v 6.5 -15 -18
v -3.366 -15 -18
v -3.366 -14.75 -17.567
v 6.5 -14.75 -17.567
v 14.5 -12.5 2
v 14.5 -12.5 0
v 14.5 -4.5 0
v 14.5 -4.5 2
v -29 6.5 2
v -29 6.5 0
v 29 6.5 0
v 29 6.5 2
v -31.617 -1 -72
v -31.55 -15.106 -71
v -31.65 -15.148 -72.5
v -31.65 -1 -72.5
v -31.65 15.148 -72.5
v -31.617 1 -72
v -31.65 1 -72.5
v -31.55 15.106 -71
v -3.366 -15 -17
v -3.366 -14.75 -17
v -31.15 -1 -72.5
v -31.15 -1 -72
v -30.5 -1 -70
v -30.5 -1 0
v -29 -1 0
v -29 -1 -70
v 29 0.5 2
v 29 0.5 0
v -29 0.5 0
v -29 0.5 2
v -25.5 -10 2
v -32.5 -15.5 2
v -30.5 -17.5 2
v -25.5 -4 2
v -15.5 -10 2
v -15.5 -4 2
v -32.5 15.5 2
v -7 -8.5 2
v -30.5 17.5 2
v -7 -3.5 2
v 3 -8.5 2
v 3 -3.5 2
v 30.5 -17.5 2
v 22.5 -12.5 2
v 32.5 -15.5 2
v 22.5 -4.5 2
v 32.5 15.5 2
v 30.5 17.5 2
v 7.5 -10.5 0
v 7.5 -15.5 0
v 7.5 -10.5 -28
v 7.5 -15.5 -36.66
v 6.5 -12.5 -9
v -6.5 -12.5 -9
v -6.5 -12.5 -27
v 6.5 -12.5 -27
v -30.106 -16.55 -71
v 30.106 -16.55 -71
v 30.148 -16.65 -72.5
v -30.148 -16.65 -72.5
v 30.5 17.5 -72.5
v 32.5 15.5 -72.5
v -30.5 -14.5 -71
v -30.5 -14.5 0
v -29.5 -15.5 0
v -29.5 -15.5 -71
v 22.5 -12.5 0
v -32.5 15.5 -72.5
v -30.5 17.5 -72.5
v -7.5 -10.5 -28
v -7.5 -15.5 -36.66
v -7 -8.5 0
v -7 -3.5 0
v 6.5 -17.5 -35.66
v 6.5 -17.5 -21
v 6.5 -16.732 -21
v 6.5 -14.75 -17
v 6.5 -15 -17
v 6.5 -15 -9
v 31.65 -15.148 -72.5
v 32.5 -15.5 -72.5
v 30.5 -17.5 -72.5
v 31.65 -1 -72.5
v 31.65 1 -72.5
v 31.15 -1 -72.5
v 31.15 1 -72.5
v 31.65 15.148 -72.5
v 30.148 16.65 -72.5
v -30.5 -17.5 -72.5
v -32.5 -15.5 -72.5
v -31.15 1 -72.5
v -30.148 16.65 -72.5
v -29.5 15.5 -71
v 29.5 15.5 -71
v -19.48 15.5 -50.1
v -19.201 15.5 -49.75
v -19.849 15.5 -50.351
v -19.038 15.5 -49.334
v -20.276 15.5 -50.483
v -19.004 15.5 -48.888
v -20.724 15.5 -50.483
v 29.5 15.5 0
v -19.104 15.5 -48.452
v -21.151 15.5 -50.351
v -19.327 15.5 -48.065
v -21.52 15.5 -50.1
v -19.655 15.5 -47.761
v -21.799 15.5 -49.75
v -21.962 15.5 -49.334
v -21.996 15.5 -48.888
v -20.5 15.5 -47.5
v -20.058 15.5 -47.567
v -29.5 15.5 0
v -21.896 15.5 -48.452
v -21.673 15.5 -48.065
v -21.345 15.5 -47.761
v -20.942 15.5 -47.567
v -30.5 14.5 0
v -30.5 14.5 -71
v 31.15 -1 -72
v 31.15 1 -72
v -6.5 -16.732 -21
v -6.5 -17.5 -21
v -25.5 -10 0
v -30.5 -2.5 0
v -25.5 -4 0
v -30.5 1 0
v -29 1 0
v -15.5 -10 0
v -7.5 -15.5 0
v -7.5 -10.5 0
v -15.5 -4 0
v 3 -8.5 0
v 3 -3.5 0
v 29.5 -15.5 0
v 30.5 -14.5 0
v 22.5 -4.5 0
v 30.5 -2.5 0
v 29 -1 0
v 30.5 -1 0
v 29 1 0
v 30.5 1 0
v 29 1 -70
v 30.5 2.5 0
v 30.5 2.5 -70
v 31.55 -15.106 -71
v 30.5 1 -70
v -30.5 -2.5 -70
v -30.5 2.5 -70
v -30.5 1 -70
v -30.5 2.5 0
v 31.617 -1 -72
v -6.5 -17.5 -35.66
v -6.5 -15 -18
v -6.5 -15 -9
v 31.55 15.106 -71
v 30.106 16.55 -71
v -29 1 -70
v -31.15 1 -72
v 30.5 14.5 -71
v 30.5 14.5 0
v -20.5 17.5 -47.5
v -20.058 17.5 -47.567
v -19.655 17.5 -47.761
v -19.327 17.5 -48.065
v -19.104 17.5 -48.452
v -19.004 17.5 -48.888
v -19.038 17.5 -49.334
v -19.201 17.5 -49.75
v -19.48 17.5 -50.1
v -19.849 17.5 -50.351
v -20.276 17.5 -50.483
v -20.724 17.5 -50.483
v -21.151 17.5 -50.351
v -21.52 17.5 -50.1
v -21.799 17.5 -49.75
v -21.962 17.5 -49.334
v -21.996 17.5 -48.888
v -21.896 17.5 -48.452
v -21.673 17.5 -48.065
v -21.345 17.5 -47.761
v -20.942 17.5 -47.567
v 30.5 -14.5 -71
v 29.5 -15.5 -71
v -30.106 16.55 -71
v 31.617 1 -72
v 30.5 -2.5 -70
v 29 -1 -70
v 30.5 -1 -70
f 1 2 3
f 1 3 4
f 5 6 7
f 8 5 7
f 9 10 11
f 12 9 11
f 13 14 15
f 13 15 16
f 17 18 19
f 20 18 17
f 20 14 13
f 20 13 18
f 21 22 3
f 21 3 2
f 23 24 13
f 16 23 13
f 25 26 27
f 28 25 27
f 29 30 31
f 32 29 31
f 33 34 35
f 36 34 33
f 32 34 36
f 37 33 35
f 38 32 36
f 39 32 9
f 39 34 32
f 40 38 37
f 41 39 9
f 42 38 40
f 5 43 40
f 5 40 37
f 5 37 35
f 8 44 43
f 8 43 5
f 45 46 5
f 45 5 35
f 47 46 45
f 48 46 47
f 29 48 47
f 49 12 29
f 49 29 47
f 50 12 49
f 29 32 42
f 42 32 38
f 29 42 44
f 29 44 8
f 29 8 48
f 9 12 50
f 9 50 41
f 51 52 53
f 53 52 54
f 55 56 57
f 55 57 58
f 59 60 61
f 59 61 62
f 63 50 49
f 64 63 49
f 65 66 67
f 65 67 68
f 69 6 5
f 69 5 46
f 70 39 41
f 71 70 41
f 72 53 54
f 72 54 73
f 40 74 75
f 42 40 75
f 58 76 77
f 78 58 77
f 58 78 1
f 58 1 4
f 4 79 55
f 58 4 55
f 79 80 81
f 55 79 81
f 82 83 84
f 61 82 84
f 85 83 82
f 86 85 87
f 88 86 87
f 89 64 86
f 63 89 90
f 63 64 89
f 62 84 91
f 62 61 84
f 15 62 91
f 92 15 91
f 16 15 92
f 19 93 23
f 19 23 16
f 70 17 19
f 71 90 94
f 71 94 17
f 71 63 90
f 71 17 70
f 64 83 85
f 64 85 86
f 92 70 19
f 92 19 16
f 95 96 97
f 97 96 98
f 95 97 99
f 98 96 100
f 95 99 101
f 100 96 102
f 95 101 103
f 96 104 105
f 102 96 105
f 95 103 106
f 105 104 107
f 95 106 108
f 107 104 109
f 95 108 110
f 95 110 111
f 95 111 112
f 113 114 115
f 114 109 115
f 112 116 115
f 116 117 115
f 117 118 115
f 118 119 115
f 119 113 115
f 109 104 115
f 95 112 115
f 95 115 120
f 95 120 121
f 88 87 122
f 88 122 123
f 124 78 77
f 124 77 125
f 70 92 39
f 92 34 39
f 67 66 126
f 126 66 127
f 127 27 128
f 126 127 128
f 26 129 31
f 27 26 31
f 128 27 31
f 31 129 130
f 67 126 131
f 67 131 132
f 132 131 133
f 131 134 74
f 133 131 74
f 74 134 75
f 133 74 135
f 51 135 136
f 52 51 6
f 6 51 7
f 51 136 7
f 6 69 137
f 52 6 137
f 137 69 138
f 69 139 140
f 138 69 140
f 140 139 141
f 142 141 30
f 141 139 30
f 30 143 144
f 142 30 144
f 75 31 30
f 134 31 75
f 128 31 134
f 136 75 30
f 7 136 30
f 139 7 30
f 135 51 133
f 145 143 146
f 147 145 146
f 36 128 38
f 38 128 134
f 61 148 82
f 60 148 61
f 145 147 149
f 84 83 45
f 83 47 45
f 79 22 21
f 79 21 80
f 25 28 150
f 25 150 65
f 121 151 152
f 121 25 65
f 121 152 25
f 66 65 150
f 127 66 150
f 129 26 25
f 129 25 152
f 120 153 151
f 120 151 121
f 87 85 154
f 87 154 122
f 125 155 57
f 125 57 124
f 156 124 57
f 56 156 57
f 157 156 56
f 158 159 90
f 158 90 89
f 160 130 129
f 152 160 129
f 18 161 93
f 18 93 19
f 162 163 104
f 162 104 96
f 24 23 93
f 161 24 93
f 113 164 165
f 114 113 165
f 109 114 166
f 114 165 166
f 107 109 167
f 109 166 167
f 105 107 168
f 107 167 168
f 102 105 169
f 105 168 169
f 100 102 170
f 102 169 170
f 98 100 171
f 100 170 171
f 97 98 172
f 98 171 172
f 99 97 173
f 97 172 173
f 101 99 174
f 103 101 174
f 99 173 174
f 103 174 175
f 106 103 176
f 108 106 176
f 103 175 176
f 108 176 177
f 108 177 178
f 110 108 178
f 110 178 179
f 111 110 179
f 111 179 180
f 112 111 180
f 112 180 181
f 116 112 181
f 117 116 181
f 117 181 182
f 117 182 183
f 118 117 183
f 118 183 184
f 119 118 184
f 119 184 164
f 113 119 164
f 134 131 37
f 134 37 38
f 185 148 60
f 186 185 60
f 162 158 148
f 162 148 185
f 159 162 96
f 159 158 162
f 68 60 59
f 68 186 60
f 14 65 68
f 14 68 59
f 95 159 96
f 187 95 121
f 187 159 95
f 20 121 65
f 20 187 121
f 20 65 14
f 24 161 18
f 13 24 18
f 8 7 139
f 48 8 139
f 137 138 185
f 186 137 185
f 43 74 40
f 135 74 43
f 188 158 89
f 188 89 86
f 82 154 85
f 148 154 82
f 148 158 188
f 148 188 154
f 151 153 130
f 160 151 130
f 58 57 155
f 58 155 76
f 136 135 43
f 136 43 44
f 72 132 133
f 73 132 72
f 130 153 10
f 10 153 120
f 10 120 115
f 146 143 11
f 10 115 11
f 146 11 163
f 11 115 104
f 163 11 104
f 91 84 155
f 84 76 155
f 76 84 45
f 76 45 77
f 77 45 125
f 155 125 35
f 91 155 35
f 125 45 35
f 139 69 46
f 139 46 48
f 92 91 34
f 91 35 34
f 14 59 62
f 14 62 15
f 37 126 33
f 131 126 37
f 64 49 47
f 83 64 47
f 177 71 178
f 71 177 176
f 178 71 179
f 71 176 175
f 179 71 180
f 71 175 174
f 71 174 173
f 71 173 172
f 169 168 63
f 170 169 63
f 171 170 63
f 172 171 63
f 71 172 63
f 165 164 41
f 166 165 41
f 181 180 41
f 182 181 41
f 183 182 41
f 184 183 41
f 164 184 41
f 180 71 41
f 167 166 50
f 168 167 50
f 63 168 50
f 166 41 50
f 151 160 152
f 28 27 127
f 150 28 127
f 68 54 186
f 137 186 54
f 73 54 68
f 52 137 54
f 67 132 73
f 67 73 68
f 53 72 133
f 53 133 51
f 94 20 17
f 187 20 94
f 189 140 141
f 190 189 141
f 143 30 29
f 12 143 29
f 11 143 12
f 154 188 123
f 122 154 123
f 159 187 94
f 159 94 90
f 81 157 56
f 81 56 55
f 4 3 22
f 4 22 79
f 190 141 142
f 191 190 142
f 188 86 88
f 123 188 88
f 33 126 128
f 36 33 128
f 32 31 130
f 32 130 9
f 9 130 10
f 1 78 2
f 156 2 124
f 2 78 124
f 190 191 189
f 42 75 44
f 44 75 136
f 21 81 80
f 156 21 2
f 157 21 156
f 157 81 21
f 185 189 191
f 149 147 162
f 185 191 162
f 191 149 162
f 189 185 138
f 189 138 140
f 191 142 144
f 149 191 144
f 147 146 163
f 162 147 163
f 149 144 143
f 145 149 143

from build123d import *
from OCP.BRepFilletAPI import BRepFilletAPI_MakeChamfer

# Parameters (mm, degrees)
CROQUIS1_W              = 3.5
CROQUIS1_H              = 6
CROQUIS1_W_2            = 10
CROQUIS1_H_2            = 5
CROQUIS1_W_3            = 8
CROQUIS1_H_3            = 8
SALIENTE_EXTRUIR1_DEPTH = 2
CROQUIS2_W              = 65
CROQUIS2_H              = 35
CROQUIS2_W_2            = 61
CROQUIS2_H_2            = 31
SALIENTE_EXTRUIR2_DEPTH = 71
SALIENTE_EXTRUIR3_DEPTH = 70
CORTAR_EXTRUIR2_REACH   = 87.57
CROQUIS9_R              = 1.5
CHAFL_N3_SIZE           = 2
CHAFL_N2_SIZE           = 1
BOSS_EXTRUDE1_DEPTH     = 1.5
CHAMFER1_SIZE           = 0.1
CHAMFER1_SIZE_2         = 1.5
SKETCH2_W               = 1
SKETCH2_H               = 2
BOSS_EXTRUDE2_DEPTH     = 0.5
SKETCH3_W               = 15
SKETCH3_H               = 20
BOSS_EXTRUDE3_DEPTH     = 7
SKETCH4_W               = 13
SKETCH4_H               = 18
CUT_EXTRUDE1_DEPTH      = 5
SKETCH5_W               = 13
SKETCH5_H               = 2.5
BOSS_EXTRUDE4_DEPTH     = 12
CHAMFER2_SIZE2          = 5
CHAMFER2_SIZE           = 8.660254038
CHAMFER3_SIZE2          = 5
CHAMFER3_SIZE           = 8.660254038
CHAMFER4_SIZE           = 3
CHAMFER4_SIZE2          = 1.732050808
BOSS_EXTRUDE5_REACH     = 76.315
SKETCH6_W               = 15
SKETCH6_H               = 5
BOSS_EXTRUDE6_REACH     = 171.868
SKETCH7_W               = 9.865861754
SKETCH7_H               = 0.5


with BuildPart() as part:
    # Croquis1 → Saliente-Extruir1 (new body)
    # profile 1 of 4: a face of its own
    with BuildSketch(Plane.XY):
        Polygon((-32.5, 6.5), (-29, 6.5), (29, 6.5), (32.5, 6.5), (32.5, 17.5), (-32.5, 17.5), align=None)
    # profile 2 of 4: a face of its own
    with BuildSketch(Plane.XY):
        with Locations((-30.75, 3.5)):
            Rectangle(CROQUIS1_W, CROQUIS1_H)
    # profile 3 of 4: a face of its own
    with BuildSketch(Plane.XY):
        with Locations((30.75, 3.5)):
            Rectangle(CROQUIS1_W, CROQUIS1_H)
    # profile 4 of 4: a face of its own
    with BuildSketch(Plane.XY):
        Polygon((29, 0.5), (-29, 0.5), (-32.5, 0.5), (-32.5, -17.5), (32.5, -17.5), (32.5, 0.5), align=None)
        with Locations((-20.5, -7)):
            Rectangle(CROQUIS1_W_2, CROQUIS1_H, mode=Mode.SUBTRACT)
        with Locations((-2, -6)):
            Rectangle(CROQUIS1_W_2, CROQUIS1_H_2, mode=Mode.SUBTRACT)
        with Locations((18.5, -8.5)):
            Rectangle(CROQUIS1_W_3, CROQUIS1_H_3, mode=Mode.SUBTRACT)
    extrude(amount=SALIENTE_EXTRUIR1_DEPTH)

    # Croquis2 → Saliente-Extruir2 (add)
    with BuildSketch(Plane(origin=(0, 0, 0), x_dir=(-1, 0, 0), z_dir=(0, 0, -1))):
        Rectangle(CROQUIS2_W, CROQUIS2_H)
        Rectangle(CROQUIS2_W_2, CROQUIS2_H_2, mode=Mode.SUBTRACT)
    extrude(amount=SALIENTE_EXTRUIR2_DEPTH)

    # Croquis3 → Saliente-Extruir3 (add)
    with BuildSketch(Plane(origin=(0, 0, 0), x_dir=(-1, 0, 0), z_dir=(0, 0, -1))):
        Polygon((-30.5, 1), (-29, 1), (-30.5, 2.5), align=None)
        Polygon((-30.5, -1), (-30.5, -2.5), (-29, -1), align=None)
        Polygon((30.5, -1), (29, -1), (30.5, -2.5), align=None)
        Polygon((30.5, 1), (30.5, 2.5), (29, 1), align=None)
    extrude(amount=SALIENTE_EXTRUIR3_DEPTH)

    # Croquis9 → Cortar-Extruir2 (cut, up to next)
    with BuildSketch(Plane(origin=(0, 17.5, 0), x_dir=(1, 0, 0), z_dir=(0, 1, 0)), mode=Mode.PRIVATE) as cortar_extruir2_sk1:
        with Locations(Location((-20.5, 49, 0), (0, 0, 270))):
            Circle(CROQUIS9_R)
    cortar_extruir2_tool1 = extrude(cortar_extruir2_sk1.sketch, amount=-CORTAR_EXTRUIR2_REACH, mode=Mode.PRIVATE) & part.part
    add(cortar_extruir2_tool1.solids().sort_by_distance((-20.5, 17.5, -49))[0], mode=Mode.SUBTRACT)

    # Chaflán3
    chafl_n3_edges = [part.edges().sort_by_distance(p)[0] for p in [
        (-32.5, -17.5, -34.5),
        (-32.5, 17.5, -34.5),
        (32.5, 17.5, -34.5),
        (32.5, -17.5, -34.5),
    ]]
    chamfer(chafl_n3_edges, length=CHAFL_N3_SIZE)

    # Chaflán2
    chafl_n2_edges = [part.edges().sort_by_distance(p)[0] for p in [
        (-30.5, 15.5, -35.5),
        (30.5, 15.5, -35.5),
        (30.5, -15.5, -35.5),
        (-30.5, -15.5, -35.5),
    ]]
    chamfer(chafl_n2_edges, length=CHAFL_N2_SIZE)

    # Sketch1 → Boss-Extrude1 (add)
    with BuildSketch(Plane(origin=(0, 0, -71), x_dir=(-1, 0, 0), z_dir=(0, 0, -1))):
        Polygon((-32.5, 15.5), (-32.5, -15.5), (-30.5, -17.5), (30.5, -17.5), (32.5, -15.5), (32.5, 15.5), (30.5, 17.5), (-30.5, 17.5), align=None)
        Polygon((-31.55, 15.106497116), (-31.55, -15.106497116), (-30.106497116, -16.55), (30.106497116, -16.55), (31.55, -15.106497116), (31.55, 15.106497116), (30.106497116, 16.55), (-30.106497116, 16.55), align=None, mode=Mode.SUBTRACT)
    extrude(amount=BOSS_EXTRUDE1_DEPTH)

    # Chamfer1
    chamfer1_edges_1 = [part.edges().sort_by_distance(p)[0] for p in [
        (0, -16.55, -72.5),
    ]]
    chamfer1_side_1 = [part.faces().sort_by_distance(p)[0] for p in [
        (0, -16.552, -72.5),
    ]]
    chamfer1_edges_2 = [part.edges().sort_by_distance(p)[0] for p in [
        (-30.828248558, -15.828248558, -72.5),
    ]]
    chamfer1_side_2 = [part.faces().sort_by_distance(p)[0] for p in [
        (-30.829662771, -15.829662771, -72.5),
    ]]
    chamfer1_edges_3 = [part.edges().sort_by_distance(p)[0] for p in [
        (-31.55, 0, -72.5),
    ]]
    chamfer1_side_3 = [part.faces().sort_by_distance(p)[0] for p in [
        (-31.552, 0, -72.5),
    ]]
    chamfer1_edges_4 = [part.edges().sort_by_distance(p)[0] for p in [
        (-30.828248558, 15.828248558, -72.5),
    ]]
    chamfer1_side_4 = [part.faces().sort_by_distance(p)[0] for p in [
        (-30.829662771, 15.829662771, -72.5),
    ]]
    chamfer1_edges_5 = [part.edges().sort_by_distance(p)[0] for p in [
        (0, 16.55, -72.5),
    ]]
    chamfer1_side_5 = [part.faces().sort_by_distance(p)[0] for p in [
        (0, 16.552, -72.5),
    ]]
    chamfer1_edges_6 = [part.edges().sort_by_distance(p)[0] for p in [
        (30.828248558, 15.828248558, -72.5),
    ]]
    chamfer1_side_6 = [part.faces().sort_by_distance(p)[0] for p in [
        (30.829662771, 15.829662771, -72.5),
    ]]
    chamfer1_edges_7 = [part.edges().sort_by_distance(p)[0] for p in [
        (31.55, 0, -72.5),
    ]]
    chamfer1_side_7 = [part.faces().sort_by_distance(p)[0] for p in [
        (31.552, 0, -72.5),
    ]]
    chamfer1_edges_8 = [part.edges().sort_by_distance(p)[0] for p in [
        (30.828248558, -15.828248558, -72.5),
    ]]
    chamfer1_side_8 = [part.faces().sort_by_distance(p)[0] for p in [
        (30.829662771, -15.829662771, -72.5),
    ]]
    chamfer1 = BRepFilletAPI_MakeChamfer(part.part.solid().wrapped)
    for e in chamfer1_edges_1:
        chamfer1.Add(CHAMFER1_SIZE - 0.0001, CHAMFER1_SIZE_2 - 0.0001, e.wrapped, chamfer1_side_1[0].wrapped)
    for e in chamfer1_edges_2:
        chamfer1.Add(CHAMFER1_SIZE - 0.0001, CHAMFER1_SIZE_2 - 0.0001, e.wrapped, chamfer1_side_2[0].wrapped)
    for e in chamfer1_edges_3:
        chamfer1.Add(CHAMFER1_SIZE - 0.0001, CHAMFER1_SIZE_2 - 0.0001, e.wrapped, chamfer1_side_3[0].wrapped)
    for e in chamfer1_edges_4:
        chamfer1.Add(CHAMFER1_SIZE - 0.0001, CHAMFER1_SIZE_2 - 0.0001, e.wrapped, chamfer1_side_4[0].wrapped)
    for e in chamfer1_edges_5:
        chamfer1.Add(CHAMFER1_SIZE - 0.0001, CHAMFER1_SIZE_2 - 0.0001, e.wrapped, chamfer1_side_5[0].wrapped)
    for e in chamfer1_edges_6:
        chamfer1.Add(CHAMFER1_SIZE - 0.0001, CHAMFER1_SIZE_2 - 0.0001, e.wrapped, chamfer1_side_6[0].wrapped)
    for e in chamfer1_edges_7:
        chamfer1.Add(CHAMFER1_SIZE - 0.0001, CHAMFER1_SIZE_2 - 0.0001, e.wrapped, chamfer1_side_7[0].wrapped)
    for e in chamfer1_edges_8:
        chamfer1.Add(CHAMFER1_SIZE - 0.0001, CHAMFER1_SIZE_2 - 0.0001, e.wrapped, chamfer1_side_8[0].wrapped)
    add(Compound.cast(chamfer1.Shape()), mode=Mode.REPLACE)  # a hair under: the kernel refuses the full size

    # Sketch2 → Boss-Extrude2 (add)
    with BuildSketch(Plane(origin=(0, 0, -72.5), x_dir=(-1, 0, 0), z_dir=(0, 0, -1))):
        with Locations((-31.65, 0)):
            Rectangle(SKETCH2_W, SKETCH2_H)
        with Locations((31.65, 0)):
            Rectangle(SKETCH2_W, SKETCH2_H)
    extrude(amount=-BOSS_EXTRUDE2_DEPTH)

    # Sketch3 → Boss-Extrude3 (add)
    with BuildSketch(Plane.XZ.offset(17.5)):
        with Locations((0, -18)):
            Rectangle(SKETCH3_W, SKETCH3_H)
    extrude(amount=-BOSS_EXTRUDE3_DEPTH)

    # Sketch4 → Cut-Extrude1 (cut)
    with BuildSketch(Plane.XZ.offset(17.5)):
        with Locations((0, -18)):
            Rectangle(SKETCH4_W, SKETCH4_H)
    extrude(amount=-CUT_EXTRUDE1_DEPTH, mode=Mode.SUBTRACT)

    # Sketch5 → Boss-Extrude4 (add)
    with BuildSketch(Plane(origin=(0, 0, -9), x_dir=(-1, 0, 0), z_dir=(0, 0, -1))):
        with Locations((0, -16.25)):
            Rectangle(SKETCH5_W, SKETCH5_H)
    extrude(amount=BOSS_EXTRUDE4_DEPTH)

    # Chamfer2
    chamfer2_edges = [part.edges().sort_by_distance(p)[0] for p in [
        (0, -15.5, -28),
    ]]
    chamfer2_side = [part.faces().sort_by_distance(p)[0] for p in [
        (0, -15.5, -28.1),
    ]]
    chamfer(chamfer2_edges, length=CHAMFER2_SIZE - 0.0001, length2=CHAMFER2_SIZE2 - 0.0001, reference=chamfer2_side[0])  # a hair under: the kernel refuses the full size

    # Chamfer3
    chamfer3_edges = [part.edges().sort_by_distance(p)[0] for p in [
        (0, -17.5, -27),
    ]]
    chamfer3_side = [part.faces().sort_by_distance(p)[0] for p in [
        (0, -17.5, -27.1),
    ]]
    chamfer(chamfer3_edges, length=CHAMFER3_SIZE - 0.0001, length2=CHAMFER3_SIZE2 - 0.0001, reference=chamfer3_side[0])  # a hair under: the kernel refuses the full size

    # Chamfer4
    chamfer4_edges = [part.edges().sort_by_distance(p)[0] for p in [
        (0, -15, -21),
    ]]
    chamfer4_side = [part.faces().sort_by_distance(p)[0] for p in [
        (0, -15, -15),
    ]]
    chamfer(chamfer4_edges, length=CHAMFER4_SIZE, length2=CHAMFER4_SIZE2, reference=chamfer4_side[0])

    # Sketch6 → Boss-Extrude5 (add, up to next)
    with BuildSketch(Plane.XY.offset(-8), mode=Mode.PRIVATE) as boss_extrude5_sk1:
        with Locations((0, -13)):
            Rectangle(SKETCH6_W, SKETCH6_H)
    boss_extrude5_tool1 = extrude(boss_extrude5_sk1.sketch, amount=BOSS_EXTRUDE5_REACH, mode=Mode.PRIVATE) - part.part
    add(boss_extrude5_tool1.solids().sort_by_distance((0, -13, -8))[0])

    # Boss-Extrude6: up to this plane
    boss_extrude6_end = Plane(origin=(-6.5, -12.5, -17), z_dir=(0, 0, 1))
    # Sketch7 → Boss-Extrude6 (add, up to the surface)
    with BuildSketch(Plane(origin=(0, -3.455771366, 1.995190528), x_dir=(1, 0, 0), z_dir=(0, 0.8660254037844395, -0.4999999999999988)), mode=Mode.PRIVATE) as boss_extrude6_sk1:
        with Locations((1.567069123, 22.838457268)):
            Rectangle(SKETCH7_W, SKETCH7_H)
    boss_extrude6_tool1 = split(extrude(boss_extrude6_sk1.sketch, amount=BOSS_EXTRUDE6_REACH, dir=(0, 0, 1), mode=Mode.PRIVATE), bisect_by=boss_extrude6_end, keep=Keep.BOTH, mode=Mode.PRIVATE)
    add(boss_extrude6_tool1.solids().sort_by_distance((1.567069, -14.875, -17.783494))[0])


solid = part.part
